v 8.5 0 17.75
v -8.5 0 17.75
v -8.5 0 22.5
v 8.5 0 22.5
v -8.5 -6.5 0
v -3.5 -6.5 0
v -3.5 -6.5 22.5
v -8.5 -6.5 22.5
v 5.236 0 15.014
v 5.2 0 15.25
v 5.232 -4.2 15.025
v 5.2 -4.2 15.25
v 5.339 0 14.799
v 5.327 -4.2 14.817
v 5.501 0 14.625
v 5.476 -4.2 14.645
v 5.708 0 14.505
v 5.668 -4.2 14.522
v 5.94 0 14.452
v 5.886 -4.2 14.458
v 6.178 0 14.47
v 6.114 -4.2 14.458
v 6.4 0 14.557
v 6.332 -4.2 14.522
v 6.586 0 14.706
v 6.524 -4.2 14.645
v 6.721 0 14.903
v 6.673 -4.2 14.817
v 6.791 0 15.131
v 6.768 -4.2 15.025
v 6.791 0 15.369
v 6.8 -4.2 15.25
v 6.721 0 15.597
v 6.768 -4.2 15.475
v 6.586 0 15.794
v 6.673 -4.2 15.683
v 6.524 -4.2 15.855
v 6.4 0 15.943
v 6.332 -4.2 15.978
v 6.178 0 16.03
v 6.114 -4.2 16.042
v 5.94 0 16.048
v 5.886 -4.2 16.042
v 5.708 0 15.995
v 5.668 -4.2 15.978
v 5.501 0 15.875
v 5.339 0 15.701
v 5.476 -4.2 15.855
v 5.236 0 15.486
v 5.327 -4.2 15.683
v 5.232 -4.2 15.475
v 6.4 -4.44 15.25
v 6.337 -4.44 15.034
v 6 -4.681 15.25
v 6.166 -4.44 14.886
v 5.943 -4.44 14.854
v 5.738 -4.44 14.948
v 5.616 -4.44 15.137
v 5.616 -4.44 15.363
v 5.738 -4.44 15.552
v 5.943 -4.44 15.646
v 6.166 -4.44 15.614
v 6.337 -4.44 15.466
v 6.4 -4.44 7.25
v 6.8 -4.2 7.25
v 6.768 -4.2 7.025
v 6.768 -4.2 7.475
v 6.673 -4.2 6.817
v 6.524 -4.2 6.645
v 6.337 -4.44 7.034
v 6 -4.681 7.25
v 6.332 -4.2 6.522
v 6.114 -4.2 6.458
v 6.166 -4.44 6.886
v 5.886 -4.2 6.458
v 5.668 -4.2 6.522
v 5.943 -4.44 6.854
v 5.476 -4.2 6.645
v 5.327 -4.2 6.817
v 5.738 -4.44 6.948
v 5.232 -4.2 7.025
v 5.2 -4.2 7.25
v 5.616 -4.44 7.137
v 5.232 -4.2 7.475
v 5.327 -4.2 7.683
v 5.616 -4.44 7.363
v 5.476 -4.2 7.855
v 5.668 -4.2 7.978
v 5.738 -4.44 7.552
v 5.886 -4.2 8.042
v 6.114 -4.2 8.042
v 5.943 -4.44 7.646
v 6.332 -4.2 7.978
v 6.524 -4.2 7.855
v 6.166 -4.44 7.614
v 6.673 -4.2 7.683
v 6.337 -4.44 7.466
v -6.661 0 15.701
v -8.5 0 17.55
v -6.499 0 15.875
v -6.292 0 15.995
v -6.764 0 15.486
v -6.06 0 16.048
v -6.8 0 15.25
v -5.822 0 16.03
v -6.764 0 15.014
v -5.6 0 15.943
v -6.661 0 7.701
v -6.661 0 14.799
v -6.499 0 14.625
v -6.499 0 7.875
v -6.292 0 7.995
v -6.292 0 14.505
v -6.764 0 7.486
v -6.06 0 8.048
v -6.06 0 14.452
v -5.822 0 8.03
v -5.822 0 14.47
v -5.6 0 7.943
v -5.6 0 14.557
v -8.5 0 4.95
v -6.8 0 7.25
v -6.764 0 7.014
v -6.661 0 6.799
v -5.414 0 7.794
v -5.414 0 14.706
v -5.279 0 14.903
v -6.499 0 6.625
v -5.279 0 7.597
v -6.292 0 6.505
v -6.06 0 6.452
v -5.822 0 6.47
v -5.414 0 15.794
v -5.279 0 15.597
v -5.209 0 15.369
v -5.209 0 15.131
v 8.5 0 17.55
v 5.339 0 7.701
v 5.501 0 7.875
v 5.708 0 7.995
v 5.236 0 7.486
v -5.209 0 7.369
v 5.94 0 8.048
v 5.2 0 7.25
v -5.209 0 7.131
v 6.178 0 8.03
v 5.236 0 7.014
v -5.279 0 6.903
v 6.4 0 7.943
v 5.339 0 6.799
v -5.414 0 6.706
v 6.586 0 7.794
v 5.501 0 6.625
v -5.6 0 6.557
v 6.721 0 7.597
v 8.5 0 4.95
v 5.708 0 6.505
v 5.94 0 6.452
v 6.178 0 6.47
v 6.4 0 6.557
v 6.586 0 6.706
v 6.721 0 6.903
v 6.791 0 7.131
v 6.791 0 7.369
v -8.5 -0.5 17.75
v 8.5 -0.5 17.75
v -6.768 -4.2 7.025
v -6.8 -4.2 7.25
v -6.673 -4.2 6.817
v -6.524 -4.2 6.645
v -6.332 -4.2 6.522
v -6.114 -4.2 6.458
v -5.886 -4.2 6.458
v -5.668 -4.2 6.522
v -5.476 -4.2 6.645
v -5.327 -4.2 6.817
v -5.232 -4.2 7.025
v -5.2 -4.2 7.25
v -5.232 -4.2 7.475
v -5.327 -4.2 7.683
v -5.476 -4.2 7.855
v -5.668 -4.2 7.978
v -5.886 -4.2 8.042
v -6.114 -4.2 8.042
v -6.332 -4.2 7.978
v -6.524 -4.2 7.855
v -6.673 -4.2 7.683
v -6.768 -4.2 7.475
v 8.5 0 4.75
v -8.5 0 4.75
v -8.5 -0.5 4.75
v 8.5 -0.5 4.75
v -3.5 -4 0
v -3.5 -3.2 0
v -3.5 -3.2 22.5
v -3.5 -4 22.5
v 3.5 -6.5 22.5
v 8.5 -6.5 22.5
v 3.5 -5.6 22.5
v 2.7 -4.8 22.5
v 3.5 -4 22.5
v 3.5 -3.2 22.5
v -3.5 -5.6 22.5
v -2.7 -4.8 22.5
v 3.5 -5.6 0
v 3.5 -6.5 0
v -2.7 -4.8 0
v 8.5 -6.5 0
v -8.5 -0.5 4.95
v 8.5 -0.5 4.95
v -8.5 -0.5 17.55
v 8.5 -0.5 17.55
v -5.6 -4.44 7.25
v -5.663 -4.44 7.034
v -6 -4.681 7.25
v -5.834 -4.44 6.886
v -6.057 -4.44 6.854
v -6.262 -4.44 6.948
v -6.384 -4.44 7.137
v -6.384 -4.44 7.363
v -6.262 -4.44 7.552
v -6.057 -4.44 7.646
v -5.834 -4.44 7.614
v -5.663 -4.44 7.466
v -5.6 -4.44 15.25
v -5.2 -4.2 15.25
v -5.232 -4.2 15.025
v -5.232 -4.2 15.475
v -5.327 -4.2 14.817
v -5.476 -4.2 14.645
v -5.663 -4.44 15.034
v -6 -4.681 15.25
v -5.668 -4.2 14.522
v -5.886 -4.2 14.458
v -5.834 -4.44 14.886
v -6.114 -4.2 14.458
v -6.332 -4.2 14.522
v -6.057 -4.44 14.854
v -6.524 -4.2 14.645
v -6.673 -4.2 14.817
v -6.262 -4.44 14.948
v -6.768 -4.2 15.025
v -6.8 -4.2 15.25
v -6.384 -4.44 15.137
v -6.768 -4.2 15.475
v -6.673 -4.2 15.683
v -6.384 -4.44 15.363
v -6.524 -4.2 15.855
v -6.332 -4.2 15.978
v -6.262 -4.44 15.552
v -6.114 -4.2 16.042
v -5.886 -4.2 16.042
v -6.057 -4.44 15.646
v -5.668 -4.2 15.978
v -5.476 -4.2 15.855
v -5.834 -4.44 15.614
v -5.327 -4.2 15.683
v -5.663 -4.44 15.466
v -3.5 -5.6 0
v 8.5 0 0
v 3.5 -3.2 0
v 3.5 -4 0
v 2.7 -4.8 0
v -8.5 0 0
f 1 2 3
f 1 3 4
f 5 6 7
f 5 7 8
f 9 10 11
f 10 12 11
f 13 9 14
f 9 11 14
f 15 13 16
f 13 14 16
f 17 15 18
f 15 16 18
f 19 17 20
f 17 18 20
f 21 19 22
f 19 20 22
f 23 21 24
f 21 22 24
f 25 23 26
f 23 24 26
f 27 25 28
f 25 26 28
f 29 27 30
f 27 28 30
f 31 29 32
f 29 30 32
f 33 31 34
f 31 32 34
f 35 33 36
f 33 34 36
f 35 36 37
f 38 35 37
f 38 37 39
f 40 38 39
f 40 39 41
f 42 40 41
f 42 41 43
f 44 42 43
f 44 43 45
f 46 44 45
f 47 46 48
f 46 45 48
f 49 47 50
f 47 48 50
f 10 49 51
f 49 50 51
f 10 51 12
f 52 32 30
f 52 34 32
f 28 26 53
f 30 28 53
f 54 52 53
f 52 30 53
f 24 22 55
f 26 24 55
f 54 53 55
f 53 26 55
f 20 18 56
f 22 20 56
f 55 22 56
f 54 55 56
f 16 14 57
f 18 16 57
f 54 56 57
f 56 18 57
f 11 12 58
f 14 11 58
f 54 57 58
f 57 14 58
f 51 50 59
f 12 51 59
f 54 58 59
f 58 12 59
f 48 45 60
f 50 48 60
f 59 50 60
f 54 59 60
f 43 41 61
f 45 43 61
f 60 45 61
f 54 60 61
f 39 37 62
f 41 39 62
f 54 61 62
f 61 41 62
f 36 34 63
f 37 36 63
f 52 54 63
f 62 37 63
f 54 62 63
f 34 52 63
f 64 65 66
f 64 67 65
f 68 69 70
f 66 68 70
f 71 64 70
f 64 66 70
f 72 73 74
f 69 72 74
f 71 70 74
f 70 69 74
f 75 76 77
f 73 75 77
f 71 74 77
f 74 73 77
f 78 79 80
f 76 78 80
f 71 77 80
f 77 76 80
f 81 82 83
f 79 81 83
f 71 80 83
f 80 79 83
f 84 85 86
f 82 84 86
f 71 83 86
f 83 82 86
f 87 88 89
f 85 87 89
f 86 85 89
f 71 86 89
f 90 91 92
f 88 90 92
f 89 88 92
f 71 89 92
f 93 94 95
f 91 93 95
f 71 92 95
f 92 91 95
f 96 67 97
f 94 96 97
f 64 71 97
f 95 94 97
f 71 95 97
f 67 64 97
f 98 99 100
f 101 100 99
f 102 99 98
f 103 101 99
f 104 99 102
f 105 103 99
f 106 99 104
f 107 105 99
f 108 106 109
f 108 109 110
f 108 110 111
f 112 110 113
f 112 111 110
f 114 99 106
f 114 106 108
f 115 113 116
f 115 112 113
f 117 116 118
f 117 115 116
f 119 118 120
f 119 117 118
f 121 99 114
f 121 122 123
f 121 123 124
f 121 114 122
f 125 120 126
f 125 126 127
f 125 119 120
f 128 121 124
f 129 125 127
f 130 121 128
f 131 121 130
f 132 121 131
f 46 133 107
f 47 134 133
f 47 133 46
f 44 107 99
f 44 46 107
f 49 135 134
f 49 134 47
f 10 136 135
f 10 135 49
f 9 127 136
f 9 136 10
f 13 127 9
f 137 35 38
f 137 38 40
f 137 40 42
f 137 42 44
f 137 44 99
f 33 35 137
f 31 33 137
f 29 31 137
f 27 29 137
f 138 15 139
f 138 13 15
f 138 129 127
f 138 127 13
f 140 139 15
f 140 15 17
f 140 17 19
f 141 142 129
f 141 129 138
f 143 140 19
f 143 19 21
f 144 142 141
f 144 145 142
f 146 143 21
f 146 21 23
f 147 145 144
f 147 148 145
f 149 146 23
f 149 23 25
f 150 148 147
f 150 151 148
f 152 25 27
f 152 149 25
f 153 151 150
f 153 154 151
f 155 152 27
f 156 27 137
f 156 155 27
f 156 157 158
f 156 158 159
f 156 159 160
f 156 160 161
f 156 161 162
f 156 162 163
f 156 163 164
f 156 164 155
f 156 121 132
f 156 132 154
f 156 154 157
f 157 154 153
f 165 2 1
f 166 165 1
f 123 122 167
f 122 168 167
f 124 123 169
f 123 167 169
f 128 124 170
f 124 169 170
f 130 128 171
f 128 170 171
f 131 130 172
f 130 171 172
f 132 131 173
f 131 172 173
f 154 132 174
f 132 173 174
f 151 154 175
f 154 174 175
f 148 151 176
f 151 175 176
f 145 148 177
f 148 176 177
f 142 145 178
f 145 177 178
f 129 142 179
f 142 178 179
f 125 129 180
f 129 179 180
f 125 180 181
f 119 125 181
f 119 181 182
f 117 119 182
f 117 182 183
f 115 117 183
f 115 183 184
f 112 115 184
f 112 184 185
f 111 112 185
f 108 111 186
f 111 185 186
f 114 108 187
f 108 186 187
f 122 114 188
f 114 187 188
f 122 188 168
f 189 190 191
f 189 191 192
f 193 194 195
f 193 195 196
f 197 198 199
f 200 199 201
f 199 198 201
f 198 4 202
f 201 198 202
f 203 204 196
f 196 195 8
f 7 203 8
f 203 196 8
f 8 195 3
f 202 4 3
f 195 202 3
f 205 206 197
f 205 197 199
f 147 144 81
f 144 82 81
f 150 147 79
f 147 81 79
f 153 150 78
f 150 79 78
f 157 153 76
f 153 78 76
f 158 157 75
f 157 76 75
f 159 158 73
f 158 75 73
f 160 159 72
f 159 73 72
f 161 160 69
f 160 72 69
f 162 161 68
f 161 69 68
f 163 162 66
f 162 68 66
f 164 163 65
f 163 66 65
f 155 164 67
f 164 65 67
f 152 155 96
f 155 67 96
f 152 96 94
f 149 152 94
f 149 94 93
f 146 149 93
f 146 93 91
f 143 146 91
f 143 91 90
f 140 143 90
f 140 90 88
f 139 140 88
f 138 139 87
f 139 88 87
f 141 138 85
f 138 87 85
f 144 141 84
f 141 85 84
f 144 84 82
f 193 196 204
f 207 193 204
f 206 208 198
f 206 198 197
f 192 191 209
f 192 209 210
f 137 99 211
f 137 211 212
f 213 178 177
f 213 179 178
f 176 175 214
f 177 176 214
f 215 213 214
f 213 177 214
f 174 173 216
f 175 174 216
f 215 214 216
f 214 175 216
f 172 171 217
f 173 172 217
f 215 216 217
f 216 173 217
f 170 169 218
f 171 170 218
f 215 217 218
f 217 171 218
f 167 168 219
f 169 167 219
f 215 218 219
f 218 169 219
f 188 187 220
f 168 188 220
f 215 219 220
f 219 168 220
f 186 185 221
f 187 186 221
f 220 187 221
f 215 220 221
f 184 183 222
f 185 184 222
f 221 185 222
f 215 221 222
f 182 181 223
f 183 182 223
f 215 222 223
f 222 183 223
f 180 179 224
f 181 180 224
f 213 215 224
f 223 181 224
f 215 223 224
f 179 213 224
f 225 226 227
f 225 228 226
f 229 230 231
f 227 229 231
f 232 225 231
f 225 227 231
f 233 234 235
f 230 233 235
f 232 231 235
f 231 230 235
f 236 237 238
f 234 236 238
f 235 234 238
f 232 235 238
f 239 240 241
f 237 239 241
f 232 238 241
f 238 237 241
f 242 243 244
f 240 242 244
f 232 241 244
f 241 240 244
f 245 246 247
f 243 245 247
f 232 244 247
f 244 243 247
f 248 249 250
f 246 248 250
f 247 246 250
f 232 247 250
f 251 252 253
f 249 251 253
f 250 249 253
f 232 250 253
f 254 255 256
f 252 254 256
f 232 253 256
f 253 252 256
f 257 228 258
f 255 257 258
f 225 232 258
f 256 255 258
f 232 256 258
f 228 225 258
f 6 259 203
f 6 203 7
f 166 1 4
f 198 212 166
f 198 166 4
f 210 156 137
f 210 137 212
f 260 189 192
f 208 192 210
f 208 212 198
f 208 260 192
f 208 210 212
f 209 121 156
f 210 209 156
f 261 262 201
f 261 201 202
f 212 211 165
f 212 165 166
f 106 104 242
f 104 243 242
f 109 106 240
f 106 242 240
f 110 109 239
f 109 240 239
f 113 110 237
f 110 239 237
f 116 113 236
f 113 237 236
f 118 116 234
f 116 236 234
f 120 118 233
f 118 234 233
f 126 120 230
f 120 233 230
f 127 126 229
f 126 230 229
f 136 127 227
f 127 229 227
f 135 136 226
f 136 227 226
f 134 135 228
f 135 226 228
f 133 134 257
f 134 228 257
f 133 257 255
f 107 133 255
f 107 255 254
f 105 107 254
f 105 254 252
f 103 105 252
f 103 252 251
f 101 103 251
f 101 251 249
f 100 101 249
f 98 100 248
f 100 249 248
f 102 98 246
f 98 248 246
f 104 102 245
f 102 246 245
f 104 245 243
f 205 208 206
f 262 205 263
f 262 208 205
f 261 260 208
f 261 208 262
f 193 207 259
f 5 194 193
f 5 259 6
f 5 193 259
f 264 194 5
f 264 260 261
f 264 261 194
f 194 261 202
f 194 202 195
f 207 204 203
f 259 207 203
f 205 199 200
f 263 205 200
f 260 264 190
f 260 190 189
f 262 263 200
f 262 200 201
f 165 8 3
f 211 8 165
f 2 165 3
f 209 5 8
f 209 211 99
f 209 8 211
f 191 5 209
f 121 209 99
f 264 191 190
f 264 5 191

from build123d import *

# Parameters (mm, degrees)
EXTRUDE_1_DEPTH        = 22.5
SKETCH_3_W             = 17
SKETCH_3_H             = 0.2
CUT_EXTRUDE_1_DEPTH    = 0.5
HOLE_WIZARD_M2_1_D     = 1.6
HOLE_WIZARD_M2_1_DEPTH = 4.2
HOLE_WIZARD_M2_1_TIP   = 0.480688495


with BuildPart() as part:
    # 草图2 → 凸台-拉伸1 (new body)
    with BuildSketch(Plane.XY):
        Polygon((-8.5, 0), (8.5, 0), (8.5, -6.5), (3.5, -6.5), (3.5, -5.6), (2.7, -4.8), (3.5, -4), (3.5, -3.2), (-3.5, -3.2), (-3.5, -4), (-2.7, -4.8), (-3.5, -5.6), (-3.5, -6.5), (-8.5, -6.5), align=None)
    extrude(amount=EXTRUDE_1_DEPTH)

    # 草图3 → 切除-拉伸1 (cut)
    with BuildSketch(Plane(origin=(0, 0, 0), x_dir=(1, 0, 0), z_dir=(0, 1, 0))):
        with Locations((0, -17.65)):
            Rectangle(SKETCH_3_W, SKETCH_3_H)
        with Locations((0, -4.85)):
            Rectangle(SKETCH_3_W, SKETCH_3_H)
    extrude(amount=-CUT_EXTRUDE_1_DEPTH, mode=Mode.SUBTRACT)

    # M2 螺纹孔1
    with Locations(Plane(origin=(0, 0, 0), x_dir=(1, 0, 0), z_dir=(0, 1, 0))):
        with Locations((-6, -7.25), (6, -7.25), (6, -15.25), (-6, -15.25)):
            Hole(HOLE_WIZARD_M2_1_D / 2, depth=HOLE_WIZARD_M2_1_DEPTH)
            with Locations((0, 0, -(HOLE_WIZARD_M2_1_DEPTH + HOLE_WIZARD_M2_1_TIP / 2))):  # 118° drill point
                Cone(0, HOLE_WIZARD_M2_1_D / 2, HOLE_WIZARD_M2_1_TIP, mode=Mode.SUBTRACT)


solid = part.part
